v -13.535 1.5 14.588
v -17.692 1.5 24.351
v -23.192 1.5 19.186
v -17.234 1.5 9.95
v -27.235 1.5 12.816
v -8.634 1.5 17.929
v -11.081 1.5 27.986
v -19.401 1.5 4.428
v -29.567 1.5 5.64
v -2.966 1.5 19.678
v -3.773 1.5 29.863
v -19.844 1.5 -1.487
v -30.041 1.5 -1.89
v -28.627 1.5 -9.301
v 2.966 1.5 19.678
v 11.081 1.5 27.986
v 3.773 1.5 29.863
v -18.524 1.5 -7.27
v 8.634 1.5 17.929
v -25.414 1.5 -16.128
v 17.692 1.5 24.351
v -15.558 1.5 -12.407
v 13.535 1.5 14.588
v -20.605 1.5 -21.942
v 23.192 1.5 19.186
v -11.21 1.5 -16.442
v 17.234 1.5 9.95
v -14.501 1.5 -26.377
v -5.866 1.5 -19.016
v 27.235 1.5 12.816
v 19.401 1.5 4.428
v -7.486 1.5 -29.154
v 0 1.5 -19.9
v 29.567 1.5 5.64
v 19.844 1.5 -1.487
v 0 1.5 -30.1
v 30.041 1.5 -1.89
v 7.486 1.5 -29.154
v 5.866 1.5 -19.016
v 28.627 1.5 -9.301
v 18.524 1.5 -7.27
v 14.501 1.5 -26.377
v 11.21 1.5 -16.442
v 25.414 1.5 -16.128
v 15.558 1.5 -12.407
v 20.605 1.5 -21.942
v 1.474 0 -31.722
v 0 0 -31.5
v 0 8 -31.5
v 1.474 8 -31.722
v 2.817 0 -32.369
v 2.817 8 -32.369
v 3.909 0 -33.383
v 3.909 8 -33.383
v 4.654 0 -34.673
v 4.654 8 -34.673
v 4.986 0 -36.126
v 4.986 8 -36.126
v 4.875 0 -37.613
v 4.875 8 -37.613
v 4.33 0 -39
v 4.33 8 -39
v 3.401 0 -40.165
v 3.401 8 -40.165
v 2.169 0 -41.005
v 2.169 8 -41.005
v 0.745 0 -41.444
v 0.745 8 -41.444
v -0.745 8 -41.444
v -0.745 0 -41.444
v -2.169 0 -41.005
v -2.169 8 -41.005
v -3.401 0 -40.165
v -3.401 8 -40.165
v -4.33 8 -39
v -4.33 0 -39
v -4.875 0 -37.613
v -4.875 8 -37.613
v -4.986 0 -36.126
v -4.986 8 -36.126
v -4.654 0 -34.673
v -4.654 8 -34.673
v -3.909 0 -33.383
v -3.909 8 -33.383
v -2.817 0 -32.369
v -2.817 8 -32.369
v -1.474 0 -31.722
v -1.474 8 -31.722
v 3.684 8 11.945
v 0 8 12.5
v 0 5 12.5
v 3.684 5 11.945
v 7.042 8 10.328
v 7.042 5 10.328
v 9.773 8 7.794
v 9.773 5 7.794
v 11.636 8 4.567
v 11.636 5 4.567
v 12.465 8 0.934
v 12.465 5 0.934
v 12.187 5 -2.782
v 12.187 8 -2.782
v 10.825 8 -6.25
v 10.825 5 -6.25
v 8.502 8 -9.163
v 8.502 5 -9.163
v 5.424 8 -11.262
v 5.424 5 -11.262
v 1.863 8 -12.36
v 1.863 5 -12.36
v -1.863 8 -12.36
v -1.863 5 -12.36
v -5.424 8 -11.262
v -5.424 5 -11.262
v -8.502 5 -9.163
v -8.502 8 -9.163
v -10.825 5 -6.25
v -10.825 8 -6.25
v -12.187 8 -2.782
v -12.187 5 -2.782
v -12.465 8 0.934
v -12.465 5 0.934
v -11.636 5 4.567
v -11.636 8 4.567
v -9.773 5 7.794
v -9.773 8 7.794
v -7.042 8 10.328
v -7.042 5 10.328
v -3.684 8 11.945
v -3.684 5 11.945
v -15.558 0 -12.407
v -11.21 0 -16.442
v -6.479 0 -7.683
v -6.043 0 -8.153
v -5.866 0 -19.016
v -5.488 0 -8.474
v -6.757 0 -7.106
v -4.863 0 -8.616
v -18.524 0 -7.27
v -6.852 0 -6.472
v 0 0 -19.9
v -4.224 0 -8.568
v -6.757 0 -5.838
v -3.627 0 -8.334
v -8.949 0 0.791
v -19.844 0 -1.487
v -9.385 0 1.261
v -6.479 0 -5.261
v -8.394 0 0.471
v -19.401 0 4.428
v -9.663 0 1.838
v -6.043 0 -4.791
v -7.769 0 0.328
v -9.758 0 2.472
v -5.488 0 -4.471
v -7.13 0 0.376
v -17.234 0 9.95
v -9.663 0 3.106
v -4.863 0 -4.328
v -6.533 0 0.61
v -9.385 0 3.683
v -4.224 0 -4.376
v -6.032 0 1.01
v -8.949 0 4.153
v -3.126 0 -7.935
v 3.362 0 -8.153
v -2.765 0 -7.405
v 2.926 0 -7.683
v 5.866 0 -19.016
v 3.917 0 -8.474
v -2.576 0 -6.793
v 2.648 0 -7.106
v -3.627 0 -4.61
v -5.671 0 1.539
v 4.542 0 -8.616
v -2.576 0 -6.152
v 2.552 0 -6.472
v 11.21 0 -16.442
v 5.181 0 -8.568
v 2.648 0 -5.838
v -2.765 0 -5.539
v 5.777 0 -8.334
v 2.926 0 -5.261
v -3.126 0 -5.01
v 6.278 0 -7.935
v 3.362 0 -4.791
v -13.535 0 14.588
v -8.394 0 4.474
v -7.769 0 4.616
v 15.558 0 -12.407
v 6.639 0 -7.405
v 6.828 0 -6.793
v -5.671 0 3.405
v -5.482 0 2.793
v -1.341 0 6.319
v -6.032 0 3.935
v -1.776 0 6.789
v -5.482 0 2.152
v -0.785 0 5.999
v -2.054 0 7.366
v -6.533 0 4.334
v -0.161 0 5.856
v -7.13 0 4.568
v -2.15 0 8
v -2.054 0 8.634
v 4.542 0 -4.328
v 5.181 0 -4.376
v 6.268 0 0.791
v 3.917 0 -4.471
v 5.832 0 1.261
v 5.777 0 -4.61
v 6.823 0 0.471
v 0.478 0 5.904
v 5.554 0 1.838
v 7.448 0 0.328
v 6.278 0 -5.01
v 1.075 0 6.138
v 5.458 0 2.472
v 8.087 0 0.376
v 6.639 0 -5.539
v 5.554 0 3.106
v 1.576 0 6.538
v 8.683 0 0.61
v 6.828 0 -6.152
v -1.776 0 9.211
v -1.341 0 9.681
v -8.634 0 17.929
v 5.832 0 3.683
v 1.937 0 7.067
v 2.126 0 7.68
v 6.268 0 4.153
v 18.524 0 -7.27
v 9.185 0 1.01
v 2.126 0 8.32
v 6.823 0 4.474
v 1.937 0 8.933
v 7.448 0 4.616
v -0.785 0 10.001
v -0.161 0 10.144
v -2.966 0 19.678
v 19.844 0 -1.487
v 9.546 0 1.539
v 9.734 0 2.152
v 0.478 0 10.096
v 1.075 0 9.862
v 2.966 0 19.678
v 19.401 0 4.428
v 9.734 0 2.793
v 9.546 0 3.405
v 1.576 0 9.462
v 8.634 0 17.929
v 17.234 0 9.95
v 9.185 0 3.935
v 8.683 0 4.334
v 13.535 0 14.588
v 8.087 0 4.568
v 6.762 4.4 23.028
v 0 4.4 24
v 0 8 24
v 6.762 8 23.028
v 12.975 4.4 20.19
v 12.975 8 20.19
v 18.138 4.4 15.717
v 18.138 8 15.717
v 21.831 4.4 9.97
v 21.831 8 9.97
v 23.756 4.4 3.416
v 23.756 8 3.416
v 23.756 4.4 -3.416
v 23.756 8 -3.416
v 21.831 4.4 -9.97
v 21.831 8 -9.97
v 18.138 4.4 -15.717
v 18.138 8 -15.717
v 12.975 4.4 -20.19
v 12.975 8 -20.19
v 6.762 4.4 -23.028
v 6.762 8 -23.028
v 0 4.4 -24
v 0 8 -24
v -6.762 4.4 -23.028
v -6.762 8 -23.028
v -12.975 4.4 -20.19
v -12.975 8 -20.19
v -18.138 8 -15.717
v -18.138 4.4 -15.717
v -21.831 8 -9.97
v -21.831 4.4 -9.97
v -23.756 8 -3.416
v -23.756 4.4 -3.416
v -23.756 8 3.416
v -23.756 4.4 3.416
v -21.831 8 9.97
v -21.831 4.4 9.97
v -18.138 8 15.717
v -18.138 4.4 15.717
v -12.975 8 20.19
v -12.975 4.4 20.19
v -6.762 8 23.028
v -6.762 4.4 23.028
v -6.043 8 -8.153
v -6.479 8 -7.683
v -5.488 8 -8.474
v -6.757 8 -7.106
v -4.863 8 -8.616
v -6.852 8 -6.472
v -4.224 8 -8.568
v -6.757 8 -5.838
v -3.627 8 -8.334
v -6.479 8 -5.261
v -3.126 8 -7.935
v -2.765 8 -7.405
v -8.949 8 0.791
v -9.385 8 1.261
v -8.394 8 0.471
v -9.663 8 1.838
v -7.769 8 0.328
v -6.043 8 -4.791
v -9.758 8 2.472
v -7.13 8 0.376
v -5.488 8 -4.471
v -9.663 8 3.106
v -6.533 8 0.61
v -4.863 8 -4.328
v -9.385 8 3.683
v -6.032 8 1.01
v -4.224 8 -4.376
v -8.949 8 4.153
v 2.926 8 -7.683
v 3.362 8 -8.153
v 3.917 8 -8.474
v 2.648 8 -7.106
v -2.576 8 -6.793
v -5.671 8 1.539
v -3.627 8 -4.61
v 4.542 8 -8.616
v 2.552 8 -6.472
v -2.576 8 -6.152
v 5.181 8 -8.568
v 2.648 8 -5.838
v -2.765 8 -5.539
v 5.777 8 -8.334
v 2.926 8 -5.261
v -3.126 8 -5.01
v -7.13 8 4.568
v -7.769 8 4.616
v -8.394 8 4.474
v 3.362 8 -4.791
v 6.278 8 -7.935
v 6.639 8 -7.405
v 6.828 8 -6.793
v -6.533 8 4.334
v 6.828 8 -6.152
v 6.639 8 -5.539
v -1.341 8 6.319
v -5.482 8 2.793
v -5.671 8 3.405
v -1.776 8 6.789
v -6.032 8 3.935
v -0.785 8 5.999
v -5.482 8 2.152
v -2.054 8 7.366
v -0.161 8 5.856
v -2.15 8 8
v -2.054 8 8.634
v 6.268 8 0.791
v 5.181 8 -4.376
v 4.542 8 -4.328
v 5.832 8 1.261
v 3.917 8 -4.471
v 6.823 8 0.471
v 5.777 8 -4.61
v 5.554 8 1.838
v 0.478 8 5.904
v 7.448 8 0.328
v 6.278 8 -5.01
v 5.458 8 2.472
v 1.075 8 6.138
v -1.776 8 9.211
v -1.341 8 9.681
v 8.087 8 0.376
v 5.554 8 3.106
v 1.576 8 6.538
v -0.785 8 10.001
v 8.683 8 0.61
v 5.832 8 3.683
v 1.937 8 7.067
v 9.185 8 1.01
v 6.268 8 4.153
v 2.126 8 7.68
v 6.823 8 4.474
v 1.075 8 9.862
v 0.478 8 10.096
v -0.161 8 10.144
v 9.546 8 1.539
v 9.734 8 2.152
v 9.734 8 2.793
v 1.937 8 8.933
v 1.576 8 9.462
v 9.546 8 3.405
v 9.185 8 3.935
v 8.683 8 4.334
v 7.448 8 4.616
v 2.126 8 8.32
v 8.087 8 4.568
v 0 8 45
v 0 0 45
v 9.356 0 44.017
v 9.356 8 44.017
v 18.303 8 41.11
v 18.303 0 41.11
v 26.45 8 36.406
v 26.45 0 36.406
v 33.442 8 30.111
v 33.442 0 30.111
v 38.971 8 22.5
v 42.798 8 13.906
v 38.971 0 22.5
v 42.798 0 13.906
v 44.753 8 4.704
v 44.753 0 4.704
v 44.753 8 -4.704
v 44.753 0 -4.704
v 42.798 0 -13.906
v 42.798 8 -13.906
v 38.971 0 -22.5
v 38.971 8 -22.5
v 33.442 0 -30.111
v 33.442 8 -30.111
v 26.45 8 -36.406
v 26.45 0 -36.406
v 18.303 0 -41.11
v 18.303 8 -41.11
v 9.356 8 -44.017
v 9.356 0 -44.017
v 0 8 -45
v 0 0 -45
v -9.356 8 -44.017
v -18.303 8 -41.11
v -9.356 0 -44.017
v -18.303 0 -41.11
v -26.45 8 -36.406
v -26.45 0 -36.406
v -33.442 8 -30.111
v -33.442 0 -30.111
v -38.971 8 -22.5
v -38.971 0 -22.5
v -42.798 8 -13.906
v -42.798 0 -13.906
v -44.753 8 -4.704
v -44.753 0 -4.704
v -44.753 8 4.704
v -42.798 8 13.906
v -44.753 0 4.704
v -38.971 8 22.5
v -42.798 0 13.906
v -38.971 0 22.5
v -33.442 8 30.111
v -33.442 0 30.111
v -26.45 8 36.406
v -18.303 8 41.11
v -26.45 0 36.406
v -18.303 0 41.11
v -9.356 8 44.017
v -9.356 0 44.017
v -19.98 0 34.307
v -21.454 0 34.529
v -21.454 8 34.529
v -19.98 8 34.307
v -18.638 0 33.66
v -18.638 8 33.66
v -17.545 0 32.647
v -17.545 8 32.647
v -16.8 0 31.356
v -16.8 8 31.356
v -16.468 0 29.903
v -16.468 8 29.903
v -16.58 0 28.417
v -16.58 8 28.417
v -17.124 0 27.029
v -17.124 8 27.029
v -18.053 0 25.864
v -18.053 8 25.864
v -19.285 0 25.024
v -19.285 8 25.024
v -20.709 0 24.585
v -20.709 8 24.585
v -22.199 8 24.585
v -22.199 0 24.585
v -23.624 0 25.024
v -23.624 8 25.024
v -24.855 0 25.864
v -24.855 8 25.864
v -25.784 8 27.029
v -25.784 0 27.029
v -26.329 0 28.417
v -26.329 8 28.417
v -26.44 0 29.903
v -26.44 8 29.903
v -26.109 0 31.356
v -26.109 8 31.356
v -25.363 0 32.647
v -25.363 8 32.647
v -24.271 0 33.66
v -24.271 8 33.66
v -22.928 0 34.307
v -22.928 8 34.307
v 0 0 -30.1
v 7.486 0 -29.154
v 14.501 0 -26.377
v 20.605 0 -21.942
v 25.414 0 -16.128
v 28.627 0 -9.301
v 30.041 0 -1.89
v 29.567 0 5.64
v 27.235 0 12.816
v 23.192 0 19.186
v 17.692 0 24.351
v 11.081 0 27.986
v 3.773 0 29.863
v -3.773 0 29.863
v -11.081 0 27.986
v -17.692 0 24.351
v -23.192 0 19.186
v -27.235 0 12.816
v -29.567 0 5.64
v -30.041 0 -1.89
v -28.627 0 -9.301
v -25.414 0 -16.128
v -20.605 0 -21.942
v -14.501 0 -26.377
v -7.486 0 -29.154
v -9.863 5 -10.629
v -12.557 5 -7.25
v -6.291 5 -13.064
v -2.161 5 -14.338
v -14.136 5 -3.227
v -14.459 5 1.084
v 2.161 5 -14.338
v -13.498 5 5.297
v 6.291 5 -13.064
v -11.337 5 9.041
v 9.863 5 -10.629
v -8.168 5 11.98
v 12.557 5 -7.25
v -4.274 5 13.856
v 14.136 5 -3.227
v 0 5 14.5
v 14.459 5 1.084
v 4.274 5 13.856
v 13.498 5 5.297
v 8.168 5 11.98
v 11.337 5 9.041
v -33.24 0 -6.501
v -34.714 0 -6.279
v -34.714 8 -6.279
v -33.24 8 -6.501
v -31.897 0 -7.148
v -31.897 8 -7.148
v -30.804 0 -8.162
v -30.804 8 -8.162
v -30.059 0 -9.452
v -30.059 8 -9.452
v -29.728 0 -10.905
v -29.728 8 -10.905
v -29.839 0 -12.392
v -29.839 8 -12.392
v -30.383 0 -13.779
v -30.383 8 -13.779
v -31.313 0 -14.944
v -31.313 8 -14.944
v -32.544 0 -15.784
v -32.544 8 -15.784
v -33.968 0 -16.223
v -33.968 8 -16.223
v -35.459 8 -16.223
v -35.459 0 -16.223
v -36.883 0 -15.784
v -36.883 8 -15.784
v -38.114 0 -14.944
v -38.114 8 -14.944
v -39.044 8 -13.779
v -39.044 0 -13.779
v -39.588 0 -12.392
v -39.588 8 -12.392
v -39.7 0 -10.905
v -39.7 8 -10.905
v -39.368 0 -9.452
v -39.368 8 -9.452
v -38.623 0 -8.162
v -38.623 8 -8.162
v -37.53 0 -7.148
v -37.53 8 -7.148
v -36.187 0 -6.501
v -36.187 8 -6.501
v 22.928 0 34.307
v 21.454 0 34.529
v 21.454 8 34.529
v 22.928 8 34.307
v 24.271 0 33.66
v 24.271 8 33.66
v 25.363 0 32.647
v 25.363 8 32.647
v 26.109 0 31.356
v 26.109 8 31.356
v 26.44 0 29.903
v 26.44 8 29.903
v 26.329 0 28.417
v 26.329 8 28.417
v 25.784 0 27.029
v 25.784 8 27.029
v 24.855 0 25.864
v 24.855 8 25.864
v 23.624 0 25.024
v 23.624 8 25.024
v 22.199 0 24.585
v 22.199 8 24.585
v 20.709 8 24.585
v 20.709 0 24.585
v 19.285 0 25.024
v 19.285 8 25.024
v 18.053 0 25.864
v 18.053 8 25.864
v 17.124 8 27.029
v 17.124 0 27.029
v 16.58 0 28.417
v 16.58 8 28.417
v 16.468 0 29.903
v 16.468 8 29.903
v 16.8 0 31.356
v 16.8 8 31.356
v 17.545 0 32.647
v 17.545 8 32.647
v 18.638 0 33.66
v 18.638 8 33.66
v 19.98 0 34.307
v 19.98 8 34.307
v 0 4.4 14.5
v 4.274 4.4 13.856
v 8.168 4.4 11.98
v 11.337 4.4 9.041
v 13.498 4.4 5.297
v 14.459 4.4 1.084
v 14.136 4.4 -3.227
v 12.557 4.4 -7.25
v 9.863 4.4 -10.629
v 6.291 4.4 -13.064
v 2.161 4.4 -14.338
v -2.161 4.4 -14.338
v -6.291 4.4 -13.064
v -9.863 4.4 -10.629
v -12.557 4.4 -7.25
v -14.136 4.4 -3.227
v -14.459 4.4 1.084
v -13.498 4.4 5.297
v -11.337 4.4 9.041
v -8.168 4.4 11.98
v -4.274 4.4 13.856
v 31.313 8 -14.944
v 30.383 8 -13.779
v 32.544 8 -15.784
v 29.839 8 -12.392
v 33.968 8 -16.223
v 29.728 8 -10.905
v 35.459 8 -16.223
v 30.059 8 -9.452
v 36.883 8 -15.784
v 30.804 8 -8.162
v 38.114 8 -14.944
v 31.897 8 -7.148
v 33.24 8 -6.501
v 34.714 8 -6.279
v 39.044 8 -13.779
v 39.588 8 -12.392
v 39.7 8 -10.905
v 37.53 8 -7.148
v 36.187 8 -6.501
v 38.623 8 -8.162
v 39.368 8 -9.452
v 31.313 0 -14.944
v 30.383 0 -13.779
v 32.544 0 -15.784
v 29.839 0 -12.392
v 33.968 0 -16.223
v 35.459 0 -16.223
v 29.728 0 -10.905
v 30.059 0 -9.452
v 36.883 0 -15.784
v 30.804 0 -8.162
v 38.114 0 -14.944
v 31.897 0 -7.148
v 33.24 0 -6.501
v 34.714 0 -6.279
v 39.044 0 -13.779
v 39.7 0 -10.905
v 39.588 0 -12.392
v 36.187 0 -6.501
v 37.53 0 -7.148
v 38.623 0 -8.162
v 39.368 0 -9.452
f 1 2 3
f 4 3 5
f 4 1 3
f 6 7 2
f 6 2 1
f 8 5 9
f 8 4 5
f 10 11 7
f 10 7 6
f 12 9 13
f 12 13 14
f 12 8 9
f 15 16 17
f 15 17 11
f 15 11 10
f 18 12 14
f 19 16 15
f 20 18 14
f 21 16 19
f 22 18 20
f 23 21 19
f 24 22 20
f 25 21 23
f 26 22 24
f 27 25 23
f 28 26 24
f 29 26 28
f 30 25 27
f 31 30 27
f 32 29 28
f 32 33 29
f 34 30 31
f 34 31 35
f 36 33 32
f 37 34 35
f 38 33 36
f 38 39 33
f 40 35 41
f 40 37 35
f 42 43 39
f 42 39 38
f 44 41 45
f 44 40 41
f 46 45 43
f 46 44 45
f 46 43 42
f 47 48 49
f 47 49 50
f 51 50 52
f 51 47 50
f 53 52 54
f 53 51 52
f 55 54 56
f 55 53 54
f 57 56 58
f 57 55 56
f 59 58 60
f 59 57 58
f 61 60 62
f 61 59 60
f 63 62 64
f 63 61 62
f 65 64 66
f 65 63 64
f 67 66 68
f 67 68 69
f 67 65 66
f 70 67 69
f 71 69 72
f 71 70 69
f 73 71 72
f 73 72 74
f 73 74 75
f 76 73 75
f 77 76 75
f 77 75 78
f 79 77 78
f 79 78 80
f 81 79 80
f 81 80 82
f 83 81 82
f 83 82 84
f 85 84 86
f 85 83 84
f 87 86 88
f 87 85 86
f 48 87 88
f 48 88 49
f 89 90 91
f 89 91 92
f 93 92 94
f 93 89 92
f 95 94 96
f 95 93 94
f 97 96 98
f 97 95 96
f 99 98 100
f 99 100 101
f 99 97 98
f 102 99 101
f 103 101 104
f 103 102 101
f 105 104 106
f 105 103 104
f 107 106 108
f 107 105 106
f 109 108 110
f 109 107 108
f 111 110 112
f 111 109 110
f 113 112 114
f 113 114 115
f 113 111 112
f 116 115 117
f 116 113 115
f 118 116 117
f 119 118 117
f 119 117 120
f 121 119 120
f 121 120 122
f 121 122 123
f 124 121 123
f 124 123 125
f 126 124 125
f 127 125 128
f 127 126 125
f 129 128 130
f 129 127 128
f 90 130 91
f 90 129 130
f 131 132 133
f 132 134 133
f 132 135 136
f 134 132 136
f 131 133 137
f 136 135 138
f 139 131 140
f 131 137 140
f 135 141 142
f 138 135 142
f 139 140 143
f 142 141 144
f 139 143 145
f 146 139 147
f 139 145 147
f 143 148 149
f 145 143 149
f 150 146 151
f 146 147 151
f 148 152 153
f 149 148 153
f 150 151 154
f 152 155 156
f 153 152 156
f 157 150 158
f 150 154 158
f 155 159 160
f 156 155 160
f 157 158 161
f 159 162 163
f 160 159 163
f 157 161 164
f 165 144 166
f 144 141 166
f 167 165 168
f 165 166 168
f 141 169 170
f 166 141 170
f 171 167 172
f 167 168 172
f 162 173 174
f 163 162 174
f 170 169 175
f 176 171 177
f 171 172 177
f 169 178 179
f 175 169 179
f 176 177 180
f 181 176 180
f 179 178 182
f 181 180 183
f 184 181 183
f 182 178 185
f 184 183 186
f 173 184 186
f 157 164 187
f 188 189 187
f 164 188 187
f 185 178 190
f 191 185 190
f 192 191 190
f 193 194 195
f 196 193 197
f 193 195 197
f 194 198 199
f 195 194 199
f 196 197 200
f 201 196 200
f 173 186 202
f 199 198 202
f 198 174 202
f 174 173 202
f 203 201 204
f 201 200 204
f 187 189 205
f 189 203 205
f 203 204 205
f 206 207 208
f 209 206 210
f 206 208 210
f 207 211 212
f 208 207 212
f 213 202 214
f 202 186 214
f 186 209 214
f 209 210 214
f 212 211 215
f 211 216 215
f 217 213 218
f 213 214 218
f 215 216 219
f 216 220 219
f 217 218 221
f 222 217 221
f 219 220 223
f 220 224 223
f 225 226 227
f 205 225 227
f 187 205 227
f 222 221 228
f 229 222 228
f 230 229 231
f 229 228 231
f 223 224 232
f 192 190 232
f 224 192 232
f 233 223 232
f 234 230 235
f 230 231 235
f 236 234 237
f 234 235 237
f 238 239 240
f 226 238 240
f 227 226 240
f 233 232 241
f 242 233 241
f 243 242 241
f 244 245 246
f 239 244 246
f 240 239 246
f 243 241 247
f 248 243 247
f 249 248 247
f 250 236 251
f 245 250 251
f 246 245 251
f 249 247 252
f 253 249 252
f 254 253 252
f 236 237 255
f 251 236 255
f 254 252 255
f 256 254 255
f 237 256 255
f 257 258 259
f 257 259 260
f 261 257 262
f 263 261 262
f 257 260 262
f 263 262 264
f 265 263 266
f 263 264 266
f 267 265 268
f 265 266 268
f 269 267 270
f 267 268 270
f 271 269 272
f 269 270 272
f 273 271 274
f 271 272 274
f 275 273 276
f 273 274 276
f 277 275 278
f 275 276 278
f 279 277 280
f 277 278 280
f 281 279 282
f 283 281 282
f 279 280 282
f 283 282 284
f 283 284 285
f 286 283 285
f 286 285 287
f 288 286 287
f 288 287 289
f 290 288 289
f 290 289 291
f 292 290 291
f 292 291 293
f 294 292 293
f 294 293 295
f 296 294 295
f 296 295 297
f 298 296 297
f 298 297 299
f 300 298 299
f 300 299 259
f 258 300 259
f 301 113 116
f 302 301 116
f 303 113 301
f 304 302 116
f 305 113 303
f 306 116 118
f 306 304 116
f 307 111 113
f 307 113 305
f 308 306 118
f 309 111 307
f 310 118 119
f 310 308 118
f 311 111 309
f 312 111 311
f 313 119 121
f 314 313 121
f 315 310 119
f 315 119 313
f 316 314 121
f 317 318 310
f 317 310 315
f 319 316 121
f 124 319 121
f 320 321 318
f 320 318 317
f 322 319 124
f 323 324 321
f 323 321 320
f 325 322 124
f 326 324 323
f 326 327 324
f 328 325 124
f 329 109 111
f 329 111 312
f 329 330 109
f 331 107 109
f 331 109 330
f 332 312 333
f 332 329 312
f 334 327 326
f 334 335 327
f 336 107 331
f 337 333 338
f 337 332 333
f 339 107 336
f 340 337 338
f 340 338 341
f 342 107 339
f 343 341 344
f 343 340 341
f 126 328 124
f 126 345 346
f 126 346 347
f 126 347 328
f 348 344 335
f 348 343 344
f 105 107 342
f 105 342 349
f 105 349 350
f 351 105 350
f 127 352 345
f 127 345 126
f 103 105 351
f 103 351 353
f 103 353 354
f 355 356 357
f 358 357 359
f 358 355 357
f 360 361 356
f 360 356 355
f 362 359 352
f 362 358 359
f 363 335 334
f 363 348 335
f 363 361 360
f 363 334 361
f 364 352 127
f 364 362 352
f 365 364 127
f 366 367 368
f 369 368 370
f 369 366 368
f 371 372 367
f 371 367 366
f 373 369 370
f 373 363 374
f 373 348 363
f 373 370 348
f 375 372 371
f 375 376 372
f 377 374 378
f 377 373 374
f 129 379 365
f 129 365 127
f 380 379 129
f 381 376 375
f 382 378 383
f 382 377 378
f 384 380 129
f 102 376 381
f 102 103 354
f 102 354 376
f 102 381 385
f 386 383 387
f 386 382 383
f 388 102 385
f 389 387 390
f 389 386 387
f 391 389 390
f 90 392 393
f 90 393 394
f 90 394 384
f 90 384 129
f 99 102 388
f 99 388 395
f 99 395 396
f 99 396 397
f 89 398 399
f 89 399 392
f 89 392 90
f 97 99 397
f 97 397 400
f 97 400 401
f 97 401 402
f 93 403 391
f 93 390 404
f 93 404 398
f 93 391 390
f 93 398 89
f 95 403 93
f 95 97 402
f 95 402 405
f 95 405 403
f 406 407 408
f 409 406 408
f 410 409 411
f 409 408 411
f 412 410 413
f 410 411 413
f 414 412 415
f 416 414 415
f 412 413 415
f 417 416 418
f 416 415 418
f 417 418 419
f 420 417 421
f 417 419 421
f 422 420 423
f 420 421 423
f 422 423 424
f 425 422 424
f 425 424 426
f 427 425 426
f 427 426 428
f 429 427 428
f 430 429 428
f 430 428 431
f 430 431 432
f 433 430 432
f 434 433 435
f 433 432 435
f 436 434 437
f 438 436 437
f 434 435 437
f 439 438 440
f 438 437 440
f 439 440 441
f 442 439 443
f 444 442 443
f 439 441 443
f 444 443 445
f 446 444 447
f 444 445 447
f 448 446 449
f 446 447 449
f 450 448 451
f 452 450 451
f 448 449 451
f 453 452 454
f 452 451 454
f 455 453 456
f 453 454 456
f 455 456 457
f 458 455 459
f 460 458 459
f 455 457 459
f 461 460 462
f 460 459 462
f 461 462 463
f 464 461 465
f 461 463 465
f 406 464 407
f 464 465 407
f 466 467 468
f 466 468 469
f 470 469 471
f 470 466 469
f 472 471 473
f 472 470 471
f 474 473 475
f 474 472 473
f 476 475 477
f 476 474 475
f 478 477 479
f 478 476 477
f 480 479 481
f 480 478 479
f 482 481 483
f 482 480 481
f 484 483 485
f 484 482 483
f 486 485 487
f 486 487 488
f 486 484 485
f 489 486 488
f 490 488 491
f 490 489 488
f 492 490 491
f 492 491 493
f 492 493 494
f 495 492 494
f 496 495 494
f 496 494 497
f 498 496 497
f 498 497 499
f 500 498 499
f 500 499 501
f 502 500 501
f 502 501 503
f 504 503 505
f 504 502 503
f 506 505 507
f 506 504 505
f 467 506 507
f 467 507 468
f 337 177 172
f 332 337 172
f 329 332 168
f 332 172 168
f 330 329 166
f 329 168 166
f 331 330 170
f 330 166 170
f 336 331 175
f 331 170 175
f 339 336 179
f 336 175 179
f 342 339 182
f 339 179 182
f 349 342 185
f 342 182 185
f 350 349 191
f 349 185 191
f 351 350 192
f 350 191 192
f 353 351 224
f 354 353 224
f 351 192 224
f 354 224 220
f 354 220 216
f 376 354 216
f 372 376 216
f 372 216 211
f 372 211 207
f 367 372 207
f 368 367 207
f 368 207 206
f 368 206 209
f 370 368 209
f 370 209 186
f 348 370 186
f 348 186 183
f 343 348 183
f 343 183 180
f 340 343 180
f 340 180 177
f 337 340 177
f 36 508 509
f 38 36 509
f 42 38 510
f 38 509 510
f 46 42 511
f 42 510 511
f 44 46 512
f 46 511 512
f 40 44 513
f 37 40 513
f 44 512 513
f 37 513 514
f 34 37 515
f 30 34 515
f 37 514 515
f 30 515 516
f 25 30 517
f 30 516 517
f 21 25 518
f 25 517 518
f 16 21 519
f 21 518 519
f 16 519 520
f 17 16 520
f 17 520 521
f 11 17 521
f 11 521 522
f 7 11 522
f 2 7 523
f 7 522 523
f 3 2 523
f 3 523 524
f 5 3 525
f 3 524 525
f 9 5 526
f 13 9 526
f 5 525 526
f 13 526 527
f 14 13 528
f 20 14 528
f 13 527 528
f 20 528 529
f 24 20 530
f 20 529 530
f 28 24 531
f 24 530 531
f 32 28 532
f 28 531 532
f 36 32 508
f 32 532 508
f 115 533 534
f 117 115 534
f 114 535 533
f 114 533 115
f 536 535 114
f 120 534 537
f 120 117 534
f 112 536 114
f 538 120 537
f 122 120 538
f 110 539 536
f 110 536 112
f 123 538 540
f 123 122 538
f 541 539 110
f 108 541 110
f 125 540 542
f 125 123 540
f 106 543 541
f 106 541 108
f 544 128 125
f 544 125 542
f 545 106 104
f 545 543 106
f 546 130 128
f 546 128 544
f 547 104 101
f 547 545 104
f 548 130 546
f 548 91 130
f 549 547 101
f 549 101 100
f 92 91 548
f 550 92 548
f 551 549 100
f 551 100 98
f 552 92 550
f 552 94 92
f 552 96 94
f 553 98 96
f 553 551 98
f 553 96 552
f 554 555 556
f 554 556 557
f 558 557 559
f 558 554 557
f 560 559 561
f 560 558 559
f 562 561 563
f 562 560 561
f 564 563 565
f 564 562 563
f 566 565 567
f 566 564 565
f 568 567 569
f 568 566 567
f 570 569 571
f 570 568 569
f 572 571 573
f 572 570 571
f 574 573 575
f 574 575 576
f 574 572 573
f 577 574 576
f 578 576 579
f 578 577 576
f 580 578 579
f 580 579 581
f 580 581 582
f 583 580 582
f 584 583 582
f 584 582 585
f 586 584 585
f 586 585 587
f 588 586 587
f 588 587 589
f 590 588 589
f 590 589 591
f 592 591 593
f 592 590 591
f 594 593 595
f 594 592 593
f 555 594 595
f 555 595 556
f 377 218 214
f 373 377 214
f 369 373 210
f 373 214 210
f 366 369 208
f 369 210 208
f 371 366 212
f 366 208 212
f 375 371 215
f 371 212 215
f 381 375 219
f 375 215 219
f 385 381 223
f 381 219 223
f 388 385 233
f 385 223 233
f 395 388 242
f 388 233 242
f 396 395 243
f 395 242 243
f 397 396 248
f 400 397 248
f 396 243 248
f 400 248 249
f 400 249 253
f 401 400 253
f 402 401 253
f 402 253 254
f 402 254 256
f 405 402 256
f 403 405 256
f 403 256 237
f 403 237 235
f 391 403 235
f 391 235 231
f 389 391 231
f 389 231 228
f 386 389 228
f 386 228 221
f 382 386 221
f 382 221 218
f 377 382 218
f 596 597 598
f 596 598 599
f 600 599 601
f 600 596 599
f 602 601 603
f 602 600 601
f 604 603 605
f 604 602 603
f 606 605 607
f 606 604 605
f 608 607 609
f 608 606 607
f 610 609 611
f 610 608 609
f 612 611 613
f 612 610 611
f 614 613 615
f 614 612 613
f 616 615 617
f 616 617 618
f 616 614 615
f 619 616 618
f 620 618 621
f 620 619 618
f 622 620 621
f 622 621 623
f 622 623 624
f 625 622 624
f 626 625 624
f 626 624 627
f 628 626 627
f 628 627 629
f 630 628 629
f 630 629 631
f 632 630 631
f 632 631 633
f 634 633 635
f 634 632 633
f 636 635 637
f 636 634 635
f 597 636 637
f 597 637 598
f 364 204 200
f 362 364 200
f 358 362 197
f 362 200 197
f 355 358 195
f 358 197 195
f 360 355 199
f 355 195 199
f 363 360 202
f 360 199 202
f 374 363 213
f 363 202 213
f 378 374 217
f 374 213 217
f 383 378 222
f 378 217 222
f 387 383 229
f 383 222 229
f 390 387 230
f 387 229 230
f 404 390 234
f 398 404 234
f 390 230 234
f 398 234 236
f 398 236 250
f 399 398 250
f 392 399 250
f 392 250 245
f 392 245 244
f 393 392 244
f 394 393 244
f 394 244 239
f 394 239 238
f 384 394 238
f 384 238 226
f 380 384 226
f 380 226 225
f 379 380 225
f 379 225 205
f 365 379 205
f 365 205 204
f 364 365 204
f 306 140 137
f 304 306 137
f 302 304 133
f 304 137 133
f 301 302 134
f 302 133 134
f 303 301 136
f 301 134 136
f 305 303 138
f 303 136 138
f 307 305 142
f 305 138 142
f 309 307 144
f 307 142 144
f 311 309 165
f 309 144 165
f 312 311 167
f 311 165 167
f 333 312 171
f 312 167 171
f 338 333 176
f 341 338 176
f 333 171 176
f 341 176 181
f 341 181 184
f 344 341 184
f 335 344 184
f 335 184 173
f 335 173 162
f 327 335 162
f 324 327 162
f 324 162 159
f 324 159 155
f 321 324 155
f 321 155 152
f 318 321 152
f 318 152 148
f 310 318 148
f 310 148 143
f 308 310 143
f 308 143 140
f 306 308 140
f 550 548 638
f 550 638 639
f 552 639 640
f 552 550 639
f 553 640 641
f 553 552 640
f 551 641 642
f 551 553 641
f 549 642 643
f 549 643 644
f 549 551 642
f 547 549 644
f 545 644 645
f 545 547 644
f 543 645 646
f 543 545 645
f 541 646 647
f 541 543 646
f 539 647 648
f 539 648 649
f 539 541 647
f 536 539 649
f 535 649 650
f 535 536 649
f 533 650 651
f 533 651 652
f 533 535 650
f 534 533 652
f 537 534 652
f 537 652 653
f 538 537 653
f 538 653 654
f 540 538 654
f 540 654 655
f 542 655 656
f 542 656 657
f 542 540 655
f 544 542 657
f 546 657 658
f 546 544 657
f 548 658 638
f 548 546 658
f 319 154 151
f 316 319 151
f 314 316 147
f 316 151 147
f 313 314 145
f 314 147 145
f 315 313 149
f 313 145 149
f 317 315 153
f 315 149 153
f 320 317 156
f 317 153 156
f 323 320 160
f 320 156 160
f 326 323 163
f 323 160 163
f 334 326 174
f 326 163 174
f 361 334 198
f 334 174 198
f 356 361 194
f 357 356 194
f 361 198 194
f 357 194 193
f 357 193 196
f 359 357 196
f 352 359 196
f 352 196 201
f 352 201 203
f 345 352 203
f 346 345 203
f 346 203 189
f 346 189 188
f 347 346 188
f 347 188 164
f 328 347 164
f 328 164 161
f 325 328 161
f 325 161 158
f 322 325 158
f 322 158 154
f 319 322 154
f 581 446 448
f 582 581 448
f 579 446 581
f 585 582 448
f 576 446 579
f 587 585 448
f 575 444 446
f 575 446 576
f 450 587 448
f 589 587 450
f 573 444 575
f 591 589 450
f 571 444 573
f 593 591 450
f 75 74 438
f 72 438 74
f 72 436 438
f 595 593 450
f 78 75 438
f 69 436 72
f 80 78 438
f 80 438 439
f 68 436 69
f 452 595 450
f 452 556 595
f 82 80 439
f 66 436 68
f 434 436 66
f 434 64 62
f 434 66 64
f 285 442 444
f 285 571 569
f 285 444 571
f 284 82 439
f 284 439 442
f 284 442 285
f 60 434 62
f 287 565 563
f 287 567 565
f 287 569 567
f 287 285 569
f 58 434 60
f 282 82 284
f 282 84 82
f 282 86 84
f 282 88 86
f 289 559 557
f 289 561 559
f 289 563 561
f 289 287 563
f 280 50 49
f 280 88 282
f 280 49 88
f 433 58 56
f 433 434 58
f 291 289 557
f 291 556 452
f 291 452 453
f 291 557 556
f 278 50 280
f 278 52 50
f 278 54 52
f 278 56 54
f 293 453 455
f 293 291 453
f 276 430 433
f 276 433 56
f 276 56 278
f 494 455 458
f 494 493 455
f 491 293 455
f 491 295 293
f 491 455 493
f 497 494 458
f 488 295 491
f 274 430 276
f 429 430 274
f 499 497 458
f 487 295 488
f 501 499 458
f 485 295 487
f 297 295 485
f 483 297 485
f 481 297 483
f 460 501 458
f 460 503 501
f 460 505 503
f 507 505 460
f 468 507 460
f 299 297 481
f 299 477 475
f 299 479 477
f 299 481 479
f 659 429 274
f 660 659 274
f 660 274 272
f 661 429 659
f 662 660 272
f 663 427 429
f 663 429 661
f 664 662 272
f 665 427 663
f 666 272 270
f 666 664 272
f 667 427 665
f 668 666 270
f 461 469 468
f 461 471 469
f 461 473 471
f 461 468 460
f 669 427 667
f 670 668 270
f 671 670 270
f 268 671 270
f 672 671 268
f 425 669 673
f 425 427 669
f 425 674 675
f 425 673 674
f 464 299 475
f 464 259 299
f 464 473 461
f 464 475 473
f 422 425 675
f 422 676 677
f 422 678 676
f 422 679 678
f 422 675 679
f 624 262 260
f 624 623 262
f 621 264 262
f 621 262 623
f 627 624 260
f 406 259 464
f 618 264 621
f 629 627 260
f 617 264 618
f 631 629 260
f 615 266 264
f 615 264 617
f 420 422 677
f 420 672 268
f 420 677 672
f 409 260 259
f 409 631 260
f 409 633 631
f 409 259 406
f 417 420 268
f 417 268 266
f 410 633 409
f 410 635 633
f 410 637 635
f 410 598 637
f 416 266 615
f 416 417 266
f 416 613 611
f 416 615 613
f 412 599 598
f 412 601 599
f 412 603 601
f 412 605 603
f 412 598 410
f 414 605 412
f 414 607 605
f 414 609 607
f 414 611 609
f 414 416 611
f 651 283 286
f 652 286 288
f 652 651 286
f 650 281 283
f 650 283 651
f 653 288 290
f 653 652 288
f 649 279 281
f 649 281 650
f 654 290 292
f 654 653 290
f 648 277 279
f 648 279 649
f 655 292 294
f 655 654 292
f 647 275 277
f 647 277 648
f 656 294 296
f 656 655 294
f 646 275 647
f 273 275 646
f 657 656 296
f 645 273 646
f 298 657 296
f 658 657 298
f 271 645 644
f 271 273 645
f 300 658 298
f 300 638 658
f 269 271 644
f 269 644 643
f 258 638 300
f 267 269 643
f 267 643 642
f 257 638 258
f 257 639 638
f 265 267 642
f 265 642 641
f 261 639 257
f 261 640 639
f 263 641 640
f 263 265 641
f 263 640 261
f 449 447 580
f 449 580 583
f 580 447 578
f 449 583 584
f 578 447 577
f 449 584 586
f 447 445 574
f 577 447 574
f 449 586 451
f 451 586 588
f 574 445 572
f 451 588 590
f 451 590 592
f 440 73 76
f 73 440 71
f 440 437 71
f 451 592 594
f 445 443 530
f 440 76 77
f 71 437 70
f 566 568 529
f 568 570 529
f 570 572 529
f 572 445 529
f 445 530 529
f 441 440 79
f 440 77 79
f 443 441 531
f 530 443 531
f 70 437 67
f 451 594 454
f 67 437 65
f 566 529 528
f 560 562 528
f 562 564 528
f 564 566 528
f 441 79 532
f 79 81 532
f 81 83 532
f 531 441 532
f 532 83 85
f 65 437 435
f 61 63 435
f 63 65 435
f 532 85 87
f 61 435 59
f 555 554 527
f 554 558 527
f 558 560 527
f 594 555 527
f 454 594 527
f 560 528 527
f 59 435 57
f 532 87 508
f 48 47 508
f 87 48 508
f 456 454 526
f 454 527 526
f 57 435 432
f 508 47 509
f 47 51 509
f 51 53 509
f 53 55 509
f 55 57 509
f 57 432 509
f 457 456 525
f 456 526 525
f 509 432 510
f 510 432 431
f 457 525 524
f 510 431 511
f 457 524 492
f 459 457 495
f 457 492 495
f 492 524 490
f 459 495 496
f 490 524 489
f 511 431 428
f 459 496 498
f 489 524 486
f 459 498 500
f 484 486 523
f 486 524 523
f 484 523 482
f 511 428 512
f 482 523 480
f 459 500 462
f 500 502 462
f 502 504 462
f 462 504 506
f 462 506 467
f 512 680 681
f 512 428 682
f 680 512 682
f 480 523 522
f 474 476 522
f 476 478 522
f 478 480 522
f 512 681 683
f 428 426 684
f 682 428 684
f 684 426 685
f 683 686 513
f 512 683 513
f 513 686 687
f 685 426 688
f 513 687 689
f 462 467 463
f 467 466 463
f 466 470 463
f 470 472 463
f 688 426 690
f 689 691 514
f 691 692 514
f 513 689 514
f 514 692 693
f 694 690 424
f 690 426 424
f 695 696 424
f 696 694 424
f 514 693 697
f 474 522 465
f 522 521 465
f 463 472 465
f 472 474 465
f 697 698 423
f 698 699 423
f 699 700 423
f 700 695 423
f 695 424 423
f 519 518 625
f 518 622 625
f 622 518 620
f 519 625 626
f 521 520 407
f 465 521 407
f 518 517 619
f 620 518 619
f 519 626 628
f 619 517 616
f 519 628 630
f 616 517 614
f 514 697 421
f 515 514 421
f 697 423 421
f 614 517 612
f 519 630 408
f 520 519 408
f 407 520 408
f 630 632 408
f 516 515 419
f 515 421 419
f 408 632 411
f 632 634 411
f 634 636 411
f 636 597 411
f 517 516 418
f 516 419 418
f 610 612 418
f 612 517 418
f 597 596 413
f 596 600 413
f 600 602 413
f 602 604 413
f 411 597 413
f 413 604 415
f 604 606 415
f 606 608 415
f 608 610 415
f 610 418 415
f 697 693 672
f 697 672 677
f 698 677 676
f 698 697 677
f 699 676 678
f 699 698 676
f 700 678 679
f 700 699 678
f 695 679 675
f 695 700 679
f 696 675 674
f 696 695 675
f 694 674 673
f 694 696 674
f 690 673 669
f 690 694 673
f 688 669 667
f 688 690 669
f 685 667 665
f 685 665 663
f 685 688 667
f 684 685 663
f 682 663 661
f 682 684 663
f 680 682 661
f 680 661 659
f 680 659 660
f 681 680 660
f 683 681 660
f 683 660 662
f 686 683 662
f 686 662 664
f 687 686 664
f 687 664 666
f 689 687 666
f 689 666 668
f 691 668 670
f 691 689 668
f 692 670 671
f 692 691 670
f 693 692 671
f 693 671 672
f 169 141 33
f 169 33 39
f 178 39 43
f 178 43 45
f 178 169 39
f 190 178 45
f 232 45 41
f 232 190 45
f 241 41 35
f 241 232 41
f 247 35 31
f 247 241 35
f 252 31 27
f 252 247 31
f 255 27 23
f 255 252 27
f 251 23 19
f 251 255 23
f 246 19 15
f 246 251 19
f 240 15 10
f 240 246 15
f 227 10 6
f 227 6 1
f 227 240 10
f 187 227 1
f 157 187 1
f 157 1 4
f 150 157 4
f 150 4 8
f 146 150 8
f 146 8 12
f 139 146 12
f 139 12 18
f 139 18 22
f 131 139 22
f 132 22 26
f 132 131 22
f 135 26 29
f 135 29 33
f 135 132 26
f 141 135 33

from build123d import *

# Parameters (mm, degrees)
SKETCH1_R                  = 45
SKETCH1_R_2                = 5
BOSS_EXTRUDE1_DEPTH        = 8
F_4_3_4_3_DIAMETER_HOLE1_D = 4.3
SKETCH6_R                  = 30.1
SKETCH6_R_2                = 19.9
CUT_EXTRUDE2_DEPTH         = 1.5
SKETCH8_R                  = 24
SKETCH8_R_2                = 12.5
CUT_EXTRUDE3_DEPTH         = 3
SKETCH9_R                  = 24
SKETCH9_R_2                = 14.5
CUT_EXTRUDE4_DEPTH         = 0.6


with BuildPart() as part:
    # Sketch1 → Boss-Extrude1 (new body)
    with BuildSketch(Plane(origin=(0, 0, 0), x_dir=(1, 0, 0), z_dir=(0, 1, 0))):
        with Locations(Location((0, 0, 0), (0, 0, 270))):
            Circle(SKETCH1_R)
        with Locations(Location((0, 36.5, 0), (0, 0, 270))):
            Circle(SKETCH1_R_2, mode=Mode.SUBTRACT)
        with Locations(Location((34.713562845, 11.279120295, 0), (0, 0, 270))):
            Circle(SKETCH1_R_2, mode=Mode.SUBTRACT)
        with Locations(Location((21.454161709, -29.529120295, 0), (0, 0, 270))):
            Circle(SKETCH1_R_2, mode=Mode.SUBTRACT)
        with Locations(Location((-21.454161709, -29.529120295, 0), (0, 0, 270))):
            Circle(SKETCH1_R_2, mode=Mode.SUBTRACT)
        with Locations(Location((-34.713562845, 11.279120295, 0), (0, 0, 270))):
            Circle(SKETCH1_R_2, mode=Mode.SUBTRACT)
    extrude(amount=BOSS_EXTRUDE1_DEPTH)

    # Ø4.3 (4.3) Diameter Hole1 (through all)
    with Locations(Plane(origin=(0, 8, 0), x_dir=(1, 0, 0), z_dir=(0, 1, 0))):
        with Locations((-7.60845213, -2.472135955), (-4.702282018, 6.472135955), (4.702282018, 6.472135955), (7.60845213, -2.472135955), (0, -8)):
            Hole(F_4_3_4_3_DIAMETER_HOLE1_D / 2)

    # Sketch6 → Cut-Extrude2 (cut)
    with BuildSketch(Plane.XZ):
        with Locations(Location((0, 0, 0), (0, 0, 270))):
            Circle(SKETCH6_R)
        with Locations(Location((0, 0, 0), (0, 0, 270))):
            Circle(SKETCH6_R_2, mode=Mode.SUBTRACT)
    extrude(amount=-CUT_EXTRUDE2_DEPTH, mode=Mode.SUBTRACT)

    # Sketch8 → Cut-Extrude3 (cut)
    with BuildSketch(Plane(origin=(0, 8, 0), x_dir=(1, 0, 0), z_dir=(0, 1, 0))):
        with Locations(Location((0, 0, 0), (0, 0, 270))):
            Circle(SKETCH8_R)
        with Locations(Location((0, 0, 0), (0, 0, 270))):
            Circle(SKETCH8_R_2, mode=Mode.SUBTRACT)
    extrude(amount=-CUT_EXTRUDE3_DEPTH, mode=Mode.SUBTRACT)

    # Sketch9 → Cut-Extrude4 (cut)
    with BuildSketch(Plane(origin=(0, 5, 0), x_dir=(1, 0, 0), z_dir=(0, 1, 0))):
        with Locations(Location((0, 0, 0), (0, 0, 270))):
            Circle(SKETCH9_R)
        with Locations(Location((0, 0, 0), (0, 0, 270))):
            Circle(SKETCH9_R_2, mode=Mode.SUBTRACT)
    extrude(amount=-CUT_EXTRUDE4_DEPTH, mode=Mode.SUBTRACT)


solid = part.part
